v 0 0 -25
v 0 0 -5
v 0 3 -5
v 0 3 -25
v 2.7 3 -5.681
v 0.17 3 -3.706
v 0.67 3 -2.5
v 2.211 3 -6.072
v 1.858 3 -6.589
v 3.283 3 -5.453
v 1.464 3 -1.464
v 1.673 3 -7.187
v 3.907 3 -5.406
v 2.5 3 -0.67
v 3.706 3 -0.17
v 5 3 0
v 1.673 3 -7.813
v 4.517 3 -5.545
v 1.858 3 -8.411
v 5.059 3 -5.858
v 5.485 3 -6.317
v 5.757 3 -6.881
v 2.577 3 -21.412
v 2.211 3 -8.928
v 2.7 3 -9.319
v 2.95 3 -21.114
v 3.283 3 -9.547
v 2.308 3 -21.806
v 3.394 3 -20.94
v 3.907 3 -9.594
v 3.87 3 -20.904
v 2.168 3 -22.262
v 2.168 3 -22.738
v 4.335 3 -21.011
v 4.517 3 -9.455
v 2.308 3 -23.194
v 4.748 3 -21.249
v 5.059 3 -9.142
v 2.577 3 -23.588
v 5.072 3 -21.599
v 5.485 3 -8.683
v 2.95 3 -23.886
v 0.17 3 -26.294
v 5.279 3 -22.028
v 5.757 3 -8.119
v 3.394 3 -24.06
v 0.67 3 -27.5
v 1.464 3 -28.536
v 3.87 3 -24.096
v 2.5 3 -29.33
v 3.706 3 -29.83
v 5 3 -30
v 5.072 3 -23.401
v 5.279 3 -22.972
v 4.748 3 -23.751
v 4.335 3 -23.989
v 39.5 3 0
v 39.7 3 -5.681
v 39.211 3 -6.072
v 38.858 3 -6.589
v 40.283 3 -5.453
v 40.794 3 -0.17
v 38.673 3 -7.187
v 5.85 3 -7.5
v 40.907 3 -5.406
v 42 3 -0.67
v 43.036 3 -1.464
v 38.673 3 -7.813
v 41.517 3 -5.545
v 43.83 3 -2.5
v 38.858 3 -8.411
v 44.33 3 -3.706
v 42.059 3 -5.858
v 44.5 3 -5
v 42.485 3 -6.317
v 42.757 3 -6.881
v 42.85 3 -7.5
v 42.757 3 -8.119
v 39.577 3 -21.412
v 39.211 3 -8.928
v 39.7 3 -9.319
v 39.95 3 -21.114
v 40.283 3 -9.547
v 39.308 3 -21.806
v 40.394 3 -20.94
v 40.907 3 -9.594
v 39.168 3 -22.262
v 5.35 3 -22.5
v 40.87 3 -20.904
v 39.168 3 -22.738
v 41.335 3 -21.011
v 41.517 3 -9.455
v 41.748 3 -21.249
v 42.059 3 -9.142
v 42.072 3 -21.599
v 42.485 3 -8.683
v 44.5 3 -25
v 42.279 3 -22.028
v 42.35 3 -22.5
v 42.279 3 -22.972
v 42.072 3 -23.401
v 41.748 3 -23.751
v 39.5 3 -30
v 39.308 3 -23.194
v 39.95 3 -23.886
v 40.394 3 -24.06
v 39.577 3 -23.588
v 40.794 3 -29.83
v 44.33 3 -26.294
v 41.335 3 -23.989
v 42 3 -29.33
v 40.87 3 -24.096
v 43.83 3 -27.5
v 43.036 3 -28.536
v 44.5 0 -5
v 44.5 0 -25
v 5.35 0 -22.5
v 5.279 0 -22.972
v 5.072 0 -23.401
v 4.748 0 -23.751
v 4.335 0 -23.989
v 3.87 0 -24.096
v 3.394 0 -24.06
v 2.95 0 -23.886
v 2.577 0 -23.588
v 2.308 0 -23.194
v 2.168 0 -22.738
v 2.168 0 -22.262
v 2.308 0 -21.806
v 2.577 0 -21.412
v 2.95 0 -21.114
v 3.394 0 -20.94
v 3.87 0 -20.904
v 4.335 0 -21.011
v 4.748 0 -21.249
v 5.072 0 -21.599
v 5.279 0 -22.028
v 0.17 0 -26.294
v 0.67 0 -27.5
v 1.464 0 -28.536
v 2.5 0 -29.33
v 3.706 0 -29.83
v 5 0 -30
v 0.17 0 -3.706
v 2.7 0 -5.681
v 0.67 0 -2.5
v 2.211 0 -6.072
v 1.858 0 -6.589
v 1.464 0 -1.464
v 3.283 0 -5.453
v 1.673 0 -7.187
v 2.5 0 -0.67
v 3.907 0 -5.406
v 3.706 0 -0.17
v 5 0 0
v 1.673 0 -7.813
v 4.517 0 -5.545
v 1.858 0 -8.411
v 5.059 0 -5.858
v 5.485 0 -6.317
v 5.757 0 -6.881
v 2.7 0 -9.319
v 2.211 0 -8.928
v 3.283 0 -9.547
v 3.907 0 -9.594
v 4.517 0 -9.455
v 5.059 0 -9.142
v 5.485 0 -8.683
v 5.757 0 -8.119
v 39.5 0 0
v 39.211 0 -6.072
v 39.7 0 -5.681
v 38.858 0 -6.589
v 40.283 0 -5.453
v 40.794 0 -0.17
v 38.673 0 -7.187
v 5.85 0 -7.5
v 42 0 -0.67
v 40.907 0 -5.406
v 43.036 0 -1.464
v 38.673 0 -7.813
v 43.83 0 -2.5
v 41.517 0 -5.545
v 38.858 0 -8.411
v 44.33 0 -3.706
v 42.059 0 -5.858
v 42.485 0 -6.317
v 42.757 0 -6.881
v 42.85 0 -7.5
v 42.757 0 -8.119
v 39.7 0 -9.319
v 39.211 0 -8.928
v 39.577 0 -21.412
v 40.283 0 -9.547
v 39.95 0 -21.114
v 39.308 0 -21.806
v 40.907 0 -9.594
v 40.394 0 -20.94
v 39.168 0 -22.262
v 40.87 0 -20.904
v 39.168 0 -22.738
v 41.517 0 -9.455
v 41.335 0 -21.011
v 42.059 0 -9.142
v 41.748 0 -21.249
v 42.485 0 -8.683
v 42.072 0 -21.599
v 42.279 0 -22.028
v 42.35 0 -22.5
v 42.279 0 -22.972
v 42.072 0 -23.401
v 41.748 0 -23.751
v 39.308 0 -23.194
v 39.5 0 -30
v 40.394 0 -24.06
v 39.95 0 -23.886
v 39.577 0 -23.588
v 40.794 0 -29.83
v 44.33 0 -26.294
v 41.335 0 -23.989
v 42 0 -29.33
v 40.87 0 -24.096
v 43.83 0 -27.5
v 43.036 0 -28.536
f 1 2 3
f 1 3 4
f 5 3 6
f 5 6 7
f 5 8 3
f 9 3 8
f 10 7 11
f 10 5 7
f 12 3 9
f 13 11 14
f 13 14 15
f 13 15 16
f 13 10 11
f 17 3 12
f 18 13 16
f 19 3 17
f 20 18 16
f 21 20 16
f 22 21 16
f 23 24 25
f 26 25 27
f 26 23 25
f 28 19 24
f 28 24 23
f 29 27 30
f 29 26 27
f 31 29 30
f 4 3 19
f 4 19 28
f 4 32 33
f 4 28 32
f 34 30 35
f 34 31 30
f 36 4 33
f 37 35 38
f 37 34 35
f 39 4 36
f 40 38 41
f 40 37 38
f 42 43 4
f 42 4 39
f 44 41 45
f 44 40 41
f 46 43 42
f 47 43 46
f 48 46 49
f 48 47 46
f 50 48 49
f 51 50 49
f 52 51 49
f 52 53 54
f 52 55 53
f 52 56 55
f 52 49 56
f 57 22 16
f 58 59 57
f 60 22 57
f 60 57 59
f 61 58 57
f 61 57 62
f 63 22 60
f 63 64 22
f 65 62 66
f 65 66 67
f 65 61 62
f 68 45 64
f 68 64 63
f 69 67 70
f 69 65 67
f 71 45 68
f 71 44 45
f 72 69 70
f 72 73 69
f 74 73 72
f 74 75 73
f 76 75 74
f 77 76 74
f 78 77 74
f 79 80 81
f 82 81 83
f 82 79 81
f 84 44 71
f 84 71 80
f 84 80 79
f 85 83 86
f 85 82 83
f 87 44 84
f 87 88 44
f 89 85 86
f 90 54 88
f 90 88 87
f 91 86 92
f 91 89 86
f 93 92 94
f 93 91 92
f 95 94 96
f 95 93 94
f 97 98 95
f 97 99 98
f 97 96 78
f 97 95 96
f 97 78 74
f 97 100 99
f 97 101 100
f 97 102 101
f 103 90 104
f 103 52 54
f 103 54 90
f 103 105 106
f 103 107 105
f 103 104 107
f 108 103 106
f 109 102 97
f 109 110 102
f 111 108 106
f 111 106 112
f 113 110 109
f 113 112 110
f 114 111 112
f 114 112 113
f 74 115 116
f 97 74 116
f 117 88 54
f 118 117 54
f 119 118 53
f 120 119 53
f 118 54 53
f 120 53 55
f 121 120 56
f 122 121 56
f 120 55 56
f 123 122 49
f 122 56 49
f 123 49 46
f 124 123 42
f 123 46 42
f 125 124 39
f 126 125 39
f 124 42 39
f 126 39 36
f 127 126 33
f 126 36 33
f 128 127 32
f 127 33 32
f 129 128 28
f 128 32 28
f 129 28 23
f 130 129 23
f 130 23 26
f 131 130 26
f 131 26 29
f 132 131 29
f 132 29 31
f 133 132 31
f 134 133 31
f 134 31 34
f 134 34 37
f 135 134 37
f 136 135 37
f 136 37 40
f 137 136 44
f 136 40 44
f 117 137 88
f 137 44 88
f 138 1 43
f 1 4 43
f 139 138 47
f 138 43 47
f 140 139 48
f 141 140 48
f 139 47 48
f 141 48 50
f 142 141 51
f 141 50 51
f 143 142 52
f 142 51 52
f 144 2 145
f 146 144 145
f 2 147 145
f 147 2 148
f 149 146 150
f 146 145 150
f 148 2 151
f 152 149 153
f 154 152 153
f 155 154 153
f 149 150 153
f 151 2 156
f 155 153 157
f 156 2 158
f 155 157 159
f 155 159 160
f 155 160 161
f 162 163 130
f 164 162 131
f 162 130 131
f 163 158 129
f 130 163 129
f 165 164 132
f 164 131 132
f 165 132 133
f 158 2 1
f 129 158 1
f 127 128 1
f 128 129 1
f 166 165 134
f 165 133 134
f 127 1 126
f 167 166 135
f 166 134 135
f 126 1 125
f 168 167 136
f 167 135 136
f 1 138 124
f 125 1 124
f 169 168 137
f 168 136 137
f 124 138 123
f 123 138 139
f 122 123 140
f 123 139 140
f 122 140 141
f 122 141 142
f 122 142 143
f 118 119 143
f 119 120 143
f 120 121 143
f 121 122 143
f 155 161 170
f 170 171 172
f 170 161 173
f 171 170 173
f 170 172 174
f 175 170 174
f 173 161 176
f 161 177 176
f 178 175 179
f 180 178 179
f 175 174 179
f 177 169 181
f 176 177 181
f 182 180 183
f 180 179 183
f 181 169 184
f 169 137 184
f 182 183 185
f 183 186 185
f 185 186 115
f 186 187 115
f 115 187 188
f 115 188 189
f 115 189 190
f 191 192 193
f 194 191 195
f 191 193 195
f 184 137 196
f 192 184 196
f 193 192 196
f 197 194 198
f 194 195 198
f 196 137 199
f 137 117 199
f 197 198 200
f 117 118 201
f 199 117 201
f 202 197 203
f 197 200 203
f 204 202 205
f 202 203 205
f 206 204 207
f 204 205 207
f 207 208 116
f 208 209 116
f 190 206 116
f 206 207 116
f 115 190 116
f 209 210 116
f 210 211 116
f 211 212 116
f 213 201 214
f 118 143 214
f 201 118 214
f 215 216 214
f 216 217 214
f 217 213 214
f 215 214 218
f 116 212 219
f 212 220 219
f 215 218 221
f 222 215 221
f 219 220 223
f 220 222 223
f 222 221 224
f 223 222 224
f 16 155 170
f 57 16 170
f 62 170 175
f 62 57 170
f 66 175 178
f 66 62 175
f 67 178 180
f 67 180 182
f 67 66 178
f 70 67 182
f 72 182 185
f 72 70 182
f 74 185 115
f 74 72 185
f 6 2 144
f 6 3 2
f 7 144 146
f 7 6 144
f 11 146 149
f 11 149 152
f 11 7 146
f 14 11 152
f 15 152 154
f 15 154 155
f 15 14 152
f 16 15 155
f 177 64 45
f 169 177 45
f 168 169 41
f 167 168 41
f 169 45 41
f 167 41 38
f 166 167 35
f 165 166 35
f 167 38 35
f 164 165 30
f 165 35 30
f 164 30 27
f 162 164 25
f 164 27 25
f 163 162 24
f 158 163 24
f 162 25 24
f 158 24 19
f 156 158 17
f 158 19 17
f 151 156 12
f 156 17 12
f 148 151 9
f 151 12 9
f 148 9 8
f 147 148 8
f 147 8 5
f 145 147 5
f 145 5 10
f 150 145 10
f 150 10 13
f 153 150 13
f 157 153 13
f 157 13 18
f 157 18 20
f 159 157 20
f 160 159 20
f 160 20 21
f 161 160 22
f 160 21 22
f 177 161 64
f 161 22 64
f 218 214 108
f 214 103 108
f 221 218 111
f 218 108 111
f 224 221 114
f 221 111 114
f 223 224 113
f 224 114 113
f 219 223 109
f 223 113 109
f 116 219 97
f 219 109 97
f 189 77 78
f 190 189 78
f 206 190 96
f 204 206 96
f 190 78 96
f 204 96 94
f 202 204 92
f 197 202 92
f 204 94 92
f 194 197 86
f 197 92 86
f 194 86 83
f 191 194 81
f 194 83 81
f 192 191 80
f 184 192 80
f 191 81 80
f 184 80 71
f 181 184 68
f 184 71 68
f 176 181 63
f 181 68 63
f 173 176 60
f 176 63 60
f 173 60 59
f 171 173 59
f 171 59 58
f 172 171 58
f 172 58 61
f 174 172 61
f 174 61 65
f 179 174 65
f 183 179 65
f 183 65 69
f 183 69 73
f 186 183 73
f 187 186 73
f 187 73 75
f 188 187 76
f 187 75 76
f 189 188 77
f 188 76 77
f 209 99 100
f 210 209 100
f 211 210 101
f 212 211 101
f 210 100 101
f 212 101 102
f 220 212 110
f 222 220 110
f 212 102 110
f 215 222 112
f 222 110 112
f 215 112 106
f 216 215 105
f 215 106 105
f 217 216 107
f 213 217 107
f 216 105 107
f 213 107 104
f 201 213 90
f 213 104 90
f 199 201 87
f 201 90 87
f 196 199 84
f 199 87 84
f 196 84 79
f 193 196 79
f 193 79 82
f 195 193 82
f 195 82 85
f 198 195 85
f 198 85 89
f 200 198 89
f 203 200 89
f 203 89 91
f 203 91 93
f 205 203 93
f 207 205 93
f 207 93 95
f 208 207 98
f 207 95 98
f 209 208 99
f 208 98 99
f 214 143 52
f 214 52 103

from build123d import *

# Parameters (mm, degrees)
SKETCH_1_W          = 44.5
SKETCH_1_H          = 30
EXTRUDE_1_DEPTH     = 3
SKETCH_2_R          = 1.6
SKETCH_2_R_2        = 2.1
CUT_EXTRUDE_1_DEPTH = 3
FILLET_1_R          = 5


with BuildPart() as part:
    # ｽｹｯﾁ1 → ﾎﾞｽ - 押し出し1 (new body)
    with BuildSketch(Plane(origin=(0, 0, 0), x_dir=(1, 0, 0), z_dir=(0, 1, 0))):
        with Locations((22.25, 15)):
            Rectangle(SKETCH_1_W, SKETCH_1_H)
    extrude(amount=EXTRUDE_1_DEPTH)

    # ｽｹｯﾁ2 → ｶｯﾄ - 押し出し1 (cut)
    with BuildSketch(Plane(origin=(0, 3, 0), x_dir=(1, 0, 0), z_dir=(0, 1, 0))):
        with Locations((3.75, 22.5)):
            Circle(SKETCH_2_R)
        with Locations((40.75, 22.5)):
            Circle(SKETCH_2_R)
        with Locations((3.75, 7.5)):
            Circle(SKETCH_2_R_2)
        with Locations((40.75, 7.5)):
            Circle(SKETCH_2_R_2)
    extrude(amount=-CUT_EXTRUDE_1_DEPTH, mode=Mode.SUBTRACT)

    # ﾌｨﾚｯﾄ1
    fillet_1_edges = [part.edges().sort_by_distance(p)[0] for p in [
        (0, 1.5, -30),
        (44.5, 1.5, -30),
        (44.5, 1.5, 0),
        (0, 1.5, 0),
    ]]
    fillet(fillet_1_edges, radius=FILLET_1_R)


solid = part.part
